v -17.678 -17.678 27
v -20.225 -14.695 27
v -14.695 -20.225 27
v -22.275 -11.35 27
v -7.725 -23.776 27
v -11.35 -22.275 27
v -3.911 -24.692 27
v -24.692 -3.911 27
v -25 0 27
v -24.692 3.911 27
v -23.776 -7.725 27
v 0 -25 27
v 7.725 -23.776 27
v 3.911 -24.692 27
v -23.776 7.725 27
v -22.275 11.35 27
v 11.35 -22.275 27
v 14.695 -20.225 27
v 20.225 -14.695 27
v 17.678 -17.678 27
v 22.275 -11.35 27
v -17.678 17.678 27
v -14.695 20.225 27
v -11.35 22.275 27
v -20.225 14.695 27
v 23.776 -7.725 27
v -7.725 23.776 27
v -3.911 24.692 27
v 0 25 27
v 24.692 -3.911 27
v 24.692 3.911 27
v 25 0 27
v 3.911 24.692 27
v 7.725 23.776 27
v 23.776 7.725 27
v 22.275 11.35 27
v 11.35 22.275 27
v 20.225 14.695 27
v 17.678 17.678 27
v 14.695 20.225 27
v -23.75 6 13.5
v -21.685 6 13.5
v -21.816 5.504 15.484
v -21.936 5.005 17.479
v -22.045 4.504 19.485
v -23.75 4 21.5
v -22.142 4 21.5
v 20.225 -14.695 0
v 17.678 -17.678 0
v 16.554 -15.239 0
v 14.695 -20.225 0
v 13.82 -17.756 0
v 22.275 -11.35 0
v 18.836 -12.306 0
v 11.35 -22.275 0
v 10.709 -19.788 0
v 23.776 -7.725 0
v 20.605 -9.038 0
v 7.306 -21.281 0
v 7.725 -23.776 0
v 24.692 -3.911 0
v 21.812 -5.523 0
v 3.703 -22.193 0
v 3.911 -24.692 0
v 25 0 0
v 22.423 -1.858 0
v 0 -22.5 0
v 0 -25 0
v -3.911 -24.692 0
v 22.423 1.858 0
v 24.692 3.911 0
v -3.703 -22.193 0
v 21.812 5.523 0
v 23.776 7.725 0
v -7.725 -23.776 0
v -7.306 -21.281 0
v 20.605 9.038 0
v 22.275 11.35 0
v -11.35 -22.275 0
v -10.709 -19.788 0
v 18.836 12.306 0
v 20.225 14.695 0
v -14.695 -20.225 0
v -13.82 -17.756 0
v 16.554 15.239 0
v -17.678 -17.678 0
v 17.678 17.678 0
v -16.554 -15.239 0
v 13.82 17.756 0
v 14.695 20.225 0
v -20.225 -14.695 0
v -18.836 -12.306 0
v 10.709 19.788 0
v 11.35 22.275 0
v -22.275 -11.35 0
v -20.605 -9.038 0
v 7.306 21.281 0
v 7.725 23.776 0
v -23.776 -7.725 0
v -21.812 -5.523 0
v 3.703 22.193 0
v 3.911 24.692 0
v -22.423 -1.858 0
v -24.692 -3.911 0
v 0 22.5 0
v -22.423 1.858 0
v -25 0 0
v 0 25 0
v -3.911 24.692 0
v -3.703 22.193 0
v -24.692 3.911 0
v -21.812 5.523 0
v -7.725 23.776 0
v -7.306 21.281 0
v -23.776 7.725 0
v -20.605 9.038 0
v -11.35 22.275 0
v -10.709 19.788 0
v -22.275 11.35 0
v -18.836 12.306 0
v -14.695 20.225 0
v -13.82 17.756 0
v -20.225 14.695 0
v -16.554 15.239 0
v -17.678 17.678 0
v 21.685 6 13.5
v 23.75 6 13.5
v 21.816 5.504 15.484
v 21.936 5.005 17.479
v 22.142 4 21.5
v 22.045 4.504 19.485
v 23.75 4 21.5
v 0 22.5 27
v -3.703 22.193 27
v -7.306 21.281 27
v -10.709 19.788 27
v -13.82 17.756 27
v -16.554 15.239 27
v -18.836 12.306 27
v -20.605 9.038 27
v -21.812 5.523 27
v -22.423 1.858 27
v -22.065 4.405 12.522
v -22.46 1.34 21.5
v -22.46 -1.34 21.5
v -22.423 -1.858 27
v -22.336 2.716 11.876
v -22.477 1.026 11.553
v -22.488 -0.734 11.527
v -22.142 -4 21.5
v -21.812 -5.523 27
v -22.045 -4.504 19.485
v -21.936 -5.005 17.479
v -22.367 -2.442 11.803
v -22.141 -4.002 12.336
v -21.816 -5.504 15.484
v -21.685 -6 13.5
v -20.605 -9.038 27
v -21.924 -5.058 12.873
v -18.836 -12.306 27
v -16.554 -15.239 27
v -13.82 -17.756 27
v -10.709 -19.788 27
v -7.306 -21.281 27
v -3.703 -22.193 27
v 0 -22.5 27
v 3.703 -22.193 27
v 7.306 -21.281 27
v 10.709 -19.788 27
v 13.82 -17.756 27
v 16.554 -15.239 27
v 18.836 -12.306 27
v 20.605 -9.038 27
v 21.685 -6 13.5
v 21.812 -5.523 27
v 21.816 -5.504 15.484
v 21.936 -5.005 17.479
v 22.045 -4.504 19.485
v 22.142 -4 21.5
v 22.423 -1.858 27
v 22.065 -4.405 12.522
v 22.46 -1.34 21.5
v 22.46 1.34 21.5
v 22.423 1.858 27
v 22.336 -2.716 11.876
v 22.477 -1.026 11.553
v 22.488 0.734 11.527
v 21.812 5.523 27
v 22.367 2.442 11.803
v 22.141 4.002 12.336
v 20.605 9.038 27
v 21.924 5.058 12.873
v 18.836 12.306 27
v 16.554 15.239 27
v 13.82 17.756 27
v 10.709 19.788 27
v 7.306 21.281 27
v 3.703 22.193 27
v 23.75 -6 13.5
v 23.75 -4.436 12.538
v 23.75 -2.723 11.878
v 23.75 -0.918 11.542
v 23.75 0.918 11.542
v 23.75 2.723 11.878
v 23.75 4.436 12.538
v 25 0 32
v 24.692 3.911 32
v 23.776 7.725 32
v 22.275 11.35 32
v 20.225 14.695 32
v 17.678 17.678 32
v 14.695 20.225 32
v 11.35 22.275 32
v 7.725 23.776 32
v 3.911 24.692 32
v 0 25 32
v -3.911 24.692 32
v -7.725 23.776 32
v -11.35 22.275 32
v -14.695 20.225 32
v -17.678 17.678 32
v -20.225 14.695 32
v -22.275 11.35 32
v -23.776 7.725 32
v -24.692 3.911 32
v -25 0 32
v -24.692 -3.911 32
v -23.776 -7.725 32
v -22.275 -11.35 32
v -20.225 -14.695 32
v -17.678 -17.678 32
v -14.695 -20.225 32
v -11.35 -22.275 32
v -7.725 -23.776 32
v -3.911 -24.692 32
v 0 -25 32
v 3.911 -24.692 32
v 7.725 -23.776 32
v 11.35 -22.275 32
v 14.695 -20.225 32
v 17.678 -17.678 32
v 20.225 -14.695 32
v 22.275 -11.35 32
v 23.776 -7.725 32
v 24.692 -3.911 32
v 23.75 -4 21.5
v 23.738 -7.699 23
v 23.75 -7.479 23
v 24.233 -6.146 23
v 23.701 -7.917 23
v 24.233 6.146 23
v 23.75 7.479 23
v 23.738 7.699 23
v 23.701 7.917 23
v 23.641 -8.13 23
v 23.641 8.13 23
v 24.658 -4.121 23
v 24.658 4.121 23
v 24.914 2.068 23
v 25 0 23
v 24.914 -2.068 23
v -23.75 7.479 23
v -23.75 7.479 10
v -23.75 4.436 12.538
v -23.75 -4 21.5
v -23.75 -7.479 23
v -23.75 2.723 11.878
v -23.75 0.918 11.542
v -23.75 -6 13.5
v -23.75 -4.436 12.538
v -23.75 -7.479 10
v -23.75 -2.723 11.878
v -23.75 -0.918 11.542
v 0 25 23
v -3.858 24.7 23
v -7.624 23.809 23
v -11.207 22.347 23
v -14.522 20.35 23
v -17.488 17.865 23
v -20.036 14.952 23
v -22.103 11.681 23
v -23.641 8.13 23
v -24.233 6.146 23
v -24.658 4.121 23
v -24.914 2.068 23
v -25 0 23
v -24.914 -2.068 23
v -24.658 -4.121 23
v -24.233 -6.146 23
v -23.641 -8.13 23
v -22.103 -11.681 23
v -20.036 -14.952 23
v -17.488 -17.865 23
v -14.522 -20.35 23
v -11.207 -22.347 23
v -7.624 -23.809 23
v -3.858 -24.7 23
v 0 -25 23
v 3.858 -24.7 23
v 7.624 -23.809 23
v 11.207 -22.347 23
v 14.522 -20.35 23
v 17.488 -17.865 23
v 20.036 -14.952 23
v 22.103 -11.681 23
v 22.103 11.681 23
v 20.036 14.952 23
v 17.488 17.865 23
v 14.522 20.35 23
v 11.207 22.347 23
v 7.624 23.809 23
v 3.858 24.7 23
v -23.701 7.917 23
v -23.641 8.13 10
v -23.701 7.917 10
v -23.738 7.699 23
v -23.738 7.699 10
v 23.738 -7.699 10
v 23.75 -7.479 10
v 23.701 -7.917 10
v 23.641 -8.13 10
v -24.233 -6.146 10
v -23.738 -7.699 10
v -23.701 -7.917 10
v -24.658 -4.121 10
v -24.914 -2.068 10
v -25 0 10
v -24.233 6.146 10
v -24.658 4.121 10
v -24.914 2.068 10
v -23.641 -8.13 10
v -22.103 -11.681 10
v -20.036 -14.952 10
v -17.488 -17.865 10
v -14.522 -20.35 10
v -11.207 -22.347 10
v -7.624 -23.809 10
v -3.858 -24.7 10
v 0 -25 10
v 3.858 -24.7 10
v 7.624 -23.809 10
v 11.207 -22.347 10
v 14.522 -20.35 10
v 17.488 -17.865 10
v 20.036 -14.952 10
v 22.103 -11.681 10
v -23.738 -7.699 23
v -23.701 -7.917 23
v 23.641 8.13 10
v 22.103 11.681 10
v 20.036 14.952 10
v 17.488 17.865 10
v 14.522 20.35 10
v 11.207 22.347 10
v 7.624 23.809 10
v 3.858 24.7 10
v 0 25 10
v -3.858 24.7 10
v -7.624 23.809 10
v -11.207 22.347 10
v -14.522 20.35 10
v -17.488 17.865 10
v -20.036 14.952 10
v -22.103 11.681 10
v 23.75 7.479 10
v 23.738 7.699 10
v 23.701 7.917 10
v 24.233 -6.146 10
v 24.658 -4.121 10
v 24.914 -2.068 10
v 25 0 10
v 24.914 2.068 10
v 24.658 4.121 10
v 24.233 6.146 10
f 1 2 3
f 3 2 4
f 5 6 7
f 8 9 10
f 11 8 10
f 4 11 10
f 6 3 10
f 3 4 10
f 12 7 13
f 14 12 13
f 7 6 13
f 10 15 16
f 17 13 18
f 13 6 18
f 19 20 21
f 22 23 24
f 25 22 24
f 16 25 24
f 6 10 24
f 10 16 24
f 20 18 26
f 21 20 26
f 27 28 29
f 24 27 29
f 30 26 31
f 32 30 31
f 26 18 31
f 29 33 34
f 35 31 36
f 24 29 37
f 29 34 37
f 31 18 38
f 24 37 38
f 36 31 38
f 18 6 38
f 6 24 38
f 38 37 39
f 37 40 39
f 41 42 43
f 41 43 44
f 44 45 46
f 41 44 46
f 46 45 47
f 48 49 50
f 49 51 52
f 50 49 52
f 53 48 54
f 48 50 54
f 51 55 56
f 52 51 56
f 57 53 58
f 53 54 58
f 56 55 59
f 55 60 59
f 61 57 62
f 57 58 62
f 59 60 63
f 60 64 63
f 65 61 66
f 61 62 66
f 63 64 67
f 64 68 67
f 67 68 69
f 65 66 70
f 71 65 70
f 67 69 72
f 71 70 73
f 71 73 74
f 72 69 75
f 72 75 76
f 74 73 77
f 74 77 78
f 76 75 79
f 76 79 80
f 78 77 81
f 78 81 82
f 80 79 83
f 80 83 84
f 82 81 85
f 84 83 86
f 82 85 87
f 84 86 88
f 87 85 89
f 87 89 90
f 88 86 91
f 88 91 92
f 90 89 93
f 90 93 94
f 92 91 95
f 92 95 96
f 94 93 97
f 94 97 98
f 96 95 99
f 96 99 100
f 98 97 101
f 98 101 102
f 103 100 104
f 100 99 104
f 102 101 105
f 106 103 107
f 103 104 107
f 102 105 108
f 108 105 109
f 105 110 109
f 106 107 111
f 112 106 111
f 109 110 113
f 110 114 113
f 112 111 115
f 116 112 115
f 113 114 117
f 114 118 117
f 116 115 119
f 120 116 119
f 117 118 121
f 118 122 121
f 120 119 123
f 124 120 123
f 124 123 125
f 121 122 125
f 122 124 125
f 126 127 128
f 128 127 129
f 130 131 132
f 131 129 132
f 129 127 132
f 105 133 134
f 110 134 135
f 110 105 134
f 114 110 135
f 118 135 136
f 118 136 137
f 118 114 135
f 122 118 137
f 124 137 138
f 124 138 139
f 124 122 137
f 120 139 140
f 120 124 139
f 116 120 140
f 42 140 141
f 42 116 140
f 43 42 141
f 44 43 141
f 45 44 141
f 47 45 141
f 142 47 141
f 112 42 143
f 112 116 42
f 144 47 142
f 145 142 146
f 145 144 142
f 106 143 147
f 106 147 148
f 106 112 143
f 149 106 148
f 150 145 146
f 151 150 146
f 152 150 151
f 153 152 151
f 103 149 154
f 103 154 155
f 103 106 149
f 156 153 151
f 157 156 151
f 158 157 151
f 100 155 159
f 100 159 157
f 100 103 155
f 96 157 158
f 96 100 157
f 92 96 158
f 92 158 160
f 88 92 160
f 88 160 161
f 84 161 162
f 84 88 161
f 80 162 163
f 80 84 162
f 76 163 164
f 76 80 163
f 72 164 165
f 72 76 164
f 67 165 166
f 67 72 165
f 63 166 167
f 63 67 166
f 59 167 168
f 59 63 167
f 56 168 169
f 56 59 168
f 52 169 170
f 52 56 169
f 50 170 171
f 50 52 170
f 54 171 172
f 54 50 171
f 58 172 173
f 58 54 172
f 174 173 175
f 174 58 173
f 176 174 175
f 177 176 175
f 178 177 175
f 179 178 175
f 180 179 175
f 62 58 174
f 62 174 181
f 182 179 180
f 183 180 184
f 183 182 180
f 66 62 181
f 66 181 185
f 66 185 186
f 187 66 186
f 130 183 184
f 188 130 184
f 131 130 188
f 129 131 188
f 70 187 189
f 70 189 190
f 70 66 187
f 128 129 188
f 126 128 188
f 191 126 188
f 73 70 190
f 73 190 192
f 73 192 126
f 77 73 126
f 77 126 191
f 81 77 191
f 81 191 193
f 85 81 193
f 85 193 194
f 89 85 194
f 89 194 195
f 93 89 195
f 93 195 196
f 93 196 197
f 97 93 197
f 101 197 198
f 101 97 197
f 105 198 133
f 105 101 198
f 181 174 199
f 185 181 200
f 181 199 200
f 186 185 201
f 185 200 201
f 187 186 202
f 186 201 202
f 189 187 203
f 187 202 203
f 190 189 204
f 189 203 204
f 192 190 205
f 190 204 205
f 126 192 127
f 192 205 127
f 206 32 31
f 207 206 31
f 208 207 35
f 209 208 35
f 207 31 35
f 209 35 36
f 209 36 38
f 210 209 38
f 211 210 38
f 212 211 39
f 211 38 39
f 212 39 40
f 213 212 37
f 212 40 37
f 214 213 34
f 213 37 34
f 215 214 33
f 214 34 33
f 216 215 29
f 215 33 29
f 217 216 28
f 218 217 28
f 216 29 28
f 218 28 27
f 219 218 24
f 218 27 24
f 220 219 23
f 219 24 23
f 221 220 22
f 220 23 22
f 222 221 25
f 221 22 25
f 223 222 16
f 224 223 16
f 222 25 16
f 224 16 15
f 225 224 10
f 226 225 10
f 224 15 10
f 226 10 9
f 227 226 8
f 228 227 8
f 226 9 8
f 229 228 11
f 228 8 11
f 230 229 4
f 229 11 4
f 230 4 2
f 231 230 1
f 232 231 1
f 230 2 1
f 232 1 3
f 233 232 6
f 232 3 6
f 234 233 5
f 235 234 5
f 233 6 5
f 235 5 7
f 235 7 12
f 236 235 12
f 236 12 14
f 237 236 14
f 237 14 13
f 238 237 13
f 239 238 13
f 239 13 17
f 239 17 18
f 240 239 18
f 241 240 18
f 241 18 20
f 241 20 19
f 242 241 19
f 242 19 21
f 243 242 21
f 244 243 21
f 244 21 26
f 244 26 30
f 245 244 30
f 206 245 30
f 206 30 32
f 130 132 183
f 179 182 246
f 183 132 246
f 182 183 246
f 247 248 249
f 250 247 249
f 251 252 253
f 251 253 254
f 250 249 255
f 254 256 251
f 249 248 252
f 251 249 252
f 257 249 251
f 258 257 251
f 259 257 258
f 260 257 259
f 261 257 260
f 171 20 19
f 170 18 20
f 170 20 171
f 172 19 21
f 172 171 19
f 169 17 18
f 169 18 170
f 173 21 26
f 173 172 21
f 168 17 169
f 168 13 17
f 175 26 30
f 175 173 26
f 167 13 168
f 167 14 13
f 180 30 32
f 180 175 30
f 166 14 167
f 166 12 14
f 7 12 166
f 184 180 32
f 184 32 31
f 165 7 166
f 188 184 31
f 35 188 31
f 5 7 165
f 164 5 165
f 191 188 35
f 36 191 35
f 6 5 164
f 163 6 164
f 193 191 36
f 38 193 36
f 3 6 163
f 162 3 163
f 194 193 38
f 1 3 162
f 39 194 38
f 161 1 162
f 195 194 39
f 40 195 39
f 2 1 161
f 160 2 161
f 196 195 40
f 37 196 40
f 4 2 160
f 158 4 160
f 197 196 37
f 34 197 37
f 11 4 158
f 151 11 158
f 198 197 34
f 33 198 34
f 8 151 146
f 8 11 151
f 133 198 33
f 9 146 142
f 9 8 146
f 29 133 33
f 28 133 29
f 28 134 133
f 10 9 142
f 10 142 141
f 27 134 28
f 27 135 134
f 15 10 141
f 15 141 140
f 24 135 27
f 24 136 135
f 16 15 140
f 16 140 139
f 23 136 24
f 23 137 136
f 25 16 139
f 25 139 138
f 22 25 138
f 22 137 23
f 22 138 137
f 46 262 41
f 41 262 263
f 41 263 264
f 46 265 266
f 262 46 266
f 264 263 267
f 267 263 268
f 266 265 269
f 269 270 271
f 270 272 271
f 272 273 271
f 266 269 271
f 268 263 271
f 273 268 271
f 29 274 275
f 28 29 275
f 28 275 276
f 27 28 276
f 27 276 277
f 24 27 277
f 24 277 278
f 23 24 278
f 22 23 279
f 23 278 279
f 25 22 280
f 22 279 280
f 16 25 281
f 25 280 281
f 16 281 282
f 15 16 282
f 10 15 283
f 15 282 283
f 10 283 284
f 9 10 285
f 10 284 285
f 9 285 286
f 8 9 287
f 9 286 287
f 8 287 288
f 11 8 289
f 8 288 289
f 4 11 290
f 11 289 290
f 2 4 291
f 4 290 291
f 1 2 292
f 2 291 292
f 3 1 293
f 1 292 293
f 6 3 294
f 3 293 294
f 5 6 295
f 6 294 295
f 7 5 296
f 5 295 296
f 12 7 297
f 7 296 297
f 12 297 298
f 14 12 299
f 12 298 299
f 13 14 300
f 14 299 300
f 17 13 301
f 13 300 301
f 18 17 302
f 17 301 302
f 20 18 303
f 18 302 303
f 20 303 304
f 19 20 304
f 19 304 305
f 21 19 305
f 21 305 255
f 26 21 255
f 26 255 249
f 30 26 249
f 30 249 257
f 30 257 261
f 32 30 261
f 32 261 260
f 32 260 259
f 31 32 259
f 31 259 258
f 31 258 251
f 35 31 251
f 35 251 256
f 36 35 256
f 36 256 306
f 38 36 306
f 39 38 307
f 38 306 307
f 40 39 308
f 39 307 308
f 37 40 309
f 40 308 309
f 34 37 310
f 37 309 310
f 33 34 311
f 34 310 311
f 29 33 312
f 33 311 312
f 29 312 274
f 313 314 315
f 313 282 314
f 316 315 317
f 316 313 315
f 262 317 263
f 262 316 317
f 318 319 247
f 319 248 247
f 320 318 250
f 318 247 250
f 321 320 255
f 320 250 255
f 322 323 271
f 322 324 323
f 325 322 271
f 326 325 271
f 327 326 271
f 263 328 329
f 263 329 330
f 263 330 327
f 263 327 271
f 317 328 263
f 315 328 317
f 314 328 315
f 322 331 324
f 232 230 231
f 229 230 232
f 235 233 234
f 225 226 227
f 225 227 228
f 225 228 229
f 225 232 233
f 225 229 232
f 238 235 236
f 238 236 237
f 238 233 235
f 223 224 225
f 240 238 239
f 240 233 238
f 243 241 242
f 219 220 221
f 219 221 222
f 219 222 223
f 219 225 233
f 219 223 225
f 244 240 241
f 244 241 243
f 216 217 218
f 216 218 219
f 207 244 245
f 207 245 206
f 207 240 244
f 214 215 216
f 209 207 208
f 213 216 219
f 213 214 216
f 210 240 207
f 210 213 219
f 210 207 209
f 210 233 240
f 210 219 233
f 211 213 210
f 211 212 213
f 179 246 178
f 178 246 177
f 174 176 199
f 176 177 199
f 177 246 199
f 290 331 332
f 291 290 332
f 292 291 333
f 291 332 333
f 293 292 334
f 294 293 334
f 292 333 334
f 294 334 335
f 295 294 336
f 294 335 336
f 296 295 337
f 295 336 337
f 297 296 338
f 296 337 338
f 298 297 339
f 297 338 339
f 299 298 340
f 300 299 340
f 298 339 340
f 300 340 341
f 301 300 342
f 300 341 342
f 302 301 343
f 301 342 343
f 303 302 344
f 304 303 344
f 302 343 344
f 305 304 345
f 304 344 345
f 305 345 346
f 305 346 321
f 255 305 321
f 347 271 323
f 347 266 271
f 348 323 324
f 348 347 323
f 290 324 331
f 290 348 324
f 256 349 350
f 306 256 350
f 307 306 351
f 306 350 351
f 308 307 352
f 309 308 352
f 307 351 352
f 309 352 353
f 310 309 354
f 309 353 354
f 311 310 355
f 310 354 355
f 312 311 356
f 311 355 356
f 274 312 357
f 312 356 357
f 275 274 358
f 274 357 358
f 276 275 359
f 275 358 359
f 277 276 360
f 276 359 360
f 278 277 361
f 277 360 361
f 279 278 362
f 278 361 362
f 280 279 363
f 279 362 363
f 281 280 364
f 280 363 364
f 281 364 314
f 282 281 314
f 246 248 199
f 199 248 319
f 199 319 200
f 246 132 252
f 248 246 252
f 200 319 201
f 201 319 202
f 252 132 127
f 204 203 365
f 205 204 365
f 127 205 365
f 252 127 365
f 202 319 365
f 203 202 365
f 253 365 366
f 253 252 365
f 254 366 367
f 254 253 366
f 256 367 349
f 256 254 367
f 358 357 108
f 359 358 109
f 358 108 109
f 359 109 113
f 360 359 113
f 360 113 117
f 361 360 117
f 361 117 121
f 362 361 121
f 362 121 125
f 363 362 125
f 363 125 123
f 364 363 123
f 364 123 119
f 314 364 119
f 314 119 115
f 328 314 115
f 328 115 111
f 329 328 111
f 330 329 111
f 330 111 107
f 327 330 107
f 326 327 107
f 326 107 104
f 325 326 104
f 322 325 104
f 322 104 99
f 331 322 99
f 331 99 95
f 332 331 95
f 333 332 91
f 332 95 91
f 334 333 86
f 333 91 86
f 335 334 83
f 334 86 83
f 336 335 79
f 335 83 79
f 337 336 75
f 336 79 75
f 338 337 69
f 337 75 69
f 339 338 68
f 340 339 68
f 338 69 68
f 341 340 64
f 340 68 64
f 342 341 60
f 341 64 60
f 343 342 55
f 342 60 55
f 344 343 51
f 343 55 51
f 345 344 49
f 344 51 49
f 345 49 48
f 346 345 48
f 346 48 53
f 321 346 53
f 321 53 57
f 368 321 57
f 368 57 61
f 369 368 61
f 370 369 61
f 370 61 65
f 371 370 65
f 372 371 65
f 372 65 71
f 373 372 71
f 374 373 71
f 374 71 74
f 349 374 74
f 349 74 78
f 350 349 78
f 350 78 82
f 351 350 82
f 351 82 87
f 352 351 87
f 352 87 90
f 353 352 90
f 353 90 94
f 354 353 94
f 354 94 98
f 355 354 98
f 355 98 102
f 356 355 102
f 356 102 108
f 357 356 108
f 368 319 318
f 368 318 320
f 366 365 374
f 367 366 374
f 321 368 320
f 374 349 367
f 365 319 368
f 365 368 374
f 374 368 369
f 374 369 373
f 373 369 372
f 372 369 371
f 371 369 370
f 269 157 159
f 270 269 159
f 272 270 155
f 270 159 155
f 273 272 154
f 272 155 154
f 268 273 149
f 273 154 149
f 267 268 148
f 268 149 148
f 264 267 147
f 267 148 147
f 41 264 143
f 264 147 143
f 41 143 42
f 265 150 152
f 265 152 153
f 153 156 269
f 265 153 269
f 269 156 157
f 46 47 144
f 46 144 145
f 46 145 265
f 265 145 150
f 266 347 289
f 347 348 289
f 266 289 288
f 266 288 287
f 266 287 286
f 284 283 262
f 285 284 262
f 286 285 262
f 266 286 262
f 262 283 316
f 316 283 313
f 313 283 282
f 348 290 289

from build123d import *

# Parameters (mm, degrees)
EXTRUDE003_DEPTH = 47.5
OFFSET001_R      = 25
OFFSET001_R_2    = 22.5
EXTRUDE002_DEPTH = 4
FACE_R           = 25
FACE_R_2         = 22.5
EXTRUDE_DEPTH    = 10
OFFSET_R         = 22.5
EXTRUDE001_DEPTH = 13
FILLET_R         = 2
FILLET001_R      = 2
FILLET002_R      = 2
FILLET003_R      = 2
SKETCH003_R      = 25
EXTRUDE004_DEPTH = 5


with BuildPart() as extrude003:
    # Face002 → Extrude003 (new body)
    with BuildSketch(Plane(origin=(23.749999, 0, 16.462815), x_dir=(0, -1, 0), z_dir=(1, 0, 0))):
        with BuildLine():
            Line((-4, -5.037185), (4, -5.037185))
            Line((4, -5.037185), (6, 2.962815))
            ThreePointArc((6, 2.962815), (0, 4.962815), (-6, 2.962815))
            Line((-6, 2.962815), (-4, -5.037185))
        make_face()
    extrude(amount=-EXTRUDE003_DEPTH)


with BuildPart() as extrude002:
    # Offset001 → Extrude002 (new body)
    with BuildSketch(Plane(origin=(0, 0, 23), x_dir=(0, 1, 0), z_dir=(0, 0, 1))):
        Circle(OFFSET001_R)
        Circle(OFFSET001_R_2, mode=Mode.SUBTRACT)
    extrude(amount=EXTRUDE002_DEPTH)


with BuildPart() as fusion:
    # Face → Extrude (new body)
    with BuildSketch(Plane(origin=(0, 0, 0), x_dir=(0, 1, 0), z_dir=(0, 0, 1))):
        Circle(FACE_R)
        Circle(FACE_R_2, mode=Mode.SUBTRACT)
    extrude(amount=EXTRUDE_DEPTH)

    # Fusion: union Extrude002
    add(extrude002.part)


with BuildPart() as cut:
    # Offset → Extrude001 (new body)
    with BuildSketch(Plane(origin=(0, 0, 10), x_dir=(0, 1, 0), z_dir=(0, 0, 1))):
        with BuildLine():
            ThreePointArc((7.80625, -23.749999), (25, 0), (7.80625, 23.749999))
            Line((7.80625, 23.749999), (-7.80625, 23.749999))
            ThreePointArc((-7.80625, 23.749999), (-25, 0), (-7.80625, -23.749999))
            Line((-7.80625, -23.749999), (7.80625, -23.749999))
        make_face()
        Circle(OFFSET_R, mode=Mode.SUBTRACT)
    extrude(amount=EXTRUDE001_DEPTH)

    # Fillet
    fillet_edges = [cut.edges().sort_by_distance(p)[0] for p in [
        (23.749999, -7.80625, 16.5),
    ]]
    fillet(fillet_edges, radius=FILLET_R)

    # Fillet001
    fillet001_edges = [cut.edges().sort_by_distance(p)[0] for p in [
        (23.749999, 7.80625, 16.5),
    ]]
    fillet(fillet001_edges, radius=FILLET001_R)

    # Fillet002
    fillet002_edges = [cut.edges().sort_by_distance(p)[0] for p in [
        (-23.749999, 7.80625, 16.5),
    ]]
    fillet(fillet002_edges, radius=FILLET002_R)

    # Fillet003
    fillet003_edges = [cut.edges().sort_by_distance(p)[0] for p in [
        (-23.749999, -7.80625, 16.5),
    ]]
    fillet(fillet003_edges, radius=FILLET003_R)

    # Fusion001: union Fusion
    add(fusion.part)

    # Cut: cut Extrude003
    add(extrude003.part, mode=Mode.SUBTRACT)


with BuildPart() as extrude004:
    # Sketch003 (on Face4 of Extrude002) → Extrude004 (new body)
    with BuildSketch(Plane.XY.offset(27)):
        Circle(SKETCH003_R)
    extrude(amount=EXTRUDE004_DEPTH)


solid = Compound([cut.part, extrude004.part])
